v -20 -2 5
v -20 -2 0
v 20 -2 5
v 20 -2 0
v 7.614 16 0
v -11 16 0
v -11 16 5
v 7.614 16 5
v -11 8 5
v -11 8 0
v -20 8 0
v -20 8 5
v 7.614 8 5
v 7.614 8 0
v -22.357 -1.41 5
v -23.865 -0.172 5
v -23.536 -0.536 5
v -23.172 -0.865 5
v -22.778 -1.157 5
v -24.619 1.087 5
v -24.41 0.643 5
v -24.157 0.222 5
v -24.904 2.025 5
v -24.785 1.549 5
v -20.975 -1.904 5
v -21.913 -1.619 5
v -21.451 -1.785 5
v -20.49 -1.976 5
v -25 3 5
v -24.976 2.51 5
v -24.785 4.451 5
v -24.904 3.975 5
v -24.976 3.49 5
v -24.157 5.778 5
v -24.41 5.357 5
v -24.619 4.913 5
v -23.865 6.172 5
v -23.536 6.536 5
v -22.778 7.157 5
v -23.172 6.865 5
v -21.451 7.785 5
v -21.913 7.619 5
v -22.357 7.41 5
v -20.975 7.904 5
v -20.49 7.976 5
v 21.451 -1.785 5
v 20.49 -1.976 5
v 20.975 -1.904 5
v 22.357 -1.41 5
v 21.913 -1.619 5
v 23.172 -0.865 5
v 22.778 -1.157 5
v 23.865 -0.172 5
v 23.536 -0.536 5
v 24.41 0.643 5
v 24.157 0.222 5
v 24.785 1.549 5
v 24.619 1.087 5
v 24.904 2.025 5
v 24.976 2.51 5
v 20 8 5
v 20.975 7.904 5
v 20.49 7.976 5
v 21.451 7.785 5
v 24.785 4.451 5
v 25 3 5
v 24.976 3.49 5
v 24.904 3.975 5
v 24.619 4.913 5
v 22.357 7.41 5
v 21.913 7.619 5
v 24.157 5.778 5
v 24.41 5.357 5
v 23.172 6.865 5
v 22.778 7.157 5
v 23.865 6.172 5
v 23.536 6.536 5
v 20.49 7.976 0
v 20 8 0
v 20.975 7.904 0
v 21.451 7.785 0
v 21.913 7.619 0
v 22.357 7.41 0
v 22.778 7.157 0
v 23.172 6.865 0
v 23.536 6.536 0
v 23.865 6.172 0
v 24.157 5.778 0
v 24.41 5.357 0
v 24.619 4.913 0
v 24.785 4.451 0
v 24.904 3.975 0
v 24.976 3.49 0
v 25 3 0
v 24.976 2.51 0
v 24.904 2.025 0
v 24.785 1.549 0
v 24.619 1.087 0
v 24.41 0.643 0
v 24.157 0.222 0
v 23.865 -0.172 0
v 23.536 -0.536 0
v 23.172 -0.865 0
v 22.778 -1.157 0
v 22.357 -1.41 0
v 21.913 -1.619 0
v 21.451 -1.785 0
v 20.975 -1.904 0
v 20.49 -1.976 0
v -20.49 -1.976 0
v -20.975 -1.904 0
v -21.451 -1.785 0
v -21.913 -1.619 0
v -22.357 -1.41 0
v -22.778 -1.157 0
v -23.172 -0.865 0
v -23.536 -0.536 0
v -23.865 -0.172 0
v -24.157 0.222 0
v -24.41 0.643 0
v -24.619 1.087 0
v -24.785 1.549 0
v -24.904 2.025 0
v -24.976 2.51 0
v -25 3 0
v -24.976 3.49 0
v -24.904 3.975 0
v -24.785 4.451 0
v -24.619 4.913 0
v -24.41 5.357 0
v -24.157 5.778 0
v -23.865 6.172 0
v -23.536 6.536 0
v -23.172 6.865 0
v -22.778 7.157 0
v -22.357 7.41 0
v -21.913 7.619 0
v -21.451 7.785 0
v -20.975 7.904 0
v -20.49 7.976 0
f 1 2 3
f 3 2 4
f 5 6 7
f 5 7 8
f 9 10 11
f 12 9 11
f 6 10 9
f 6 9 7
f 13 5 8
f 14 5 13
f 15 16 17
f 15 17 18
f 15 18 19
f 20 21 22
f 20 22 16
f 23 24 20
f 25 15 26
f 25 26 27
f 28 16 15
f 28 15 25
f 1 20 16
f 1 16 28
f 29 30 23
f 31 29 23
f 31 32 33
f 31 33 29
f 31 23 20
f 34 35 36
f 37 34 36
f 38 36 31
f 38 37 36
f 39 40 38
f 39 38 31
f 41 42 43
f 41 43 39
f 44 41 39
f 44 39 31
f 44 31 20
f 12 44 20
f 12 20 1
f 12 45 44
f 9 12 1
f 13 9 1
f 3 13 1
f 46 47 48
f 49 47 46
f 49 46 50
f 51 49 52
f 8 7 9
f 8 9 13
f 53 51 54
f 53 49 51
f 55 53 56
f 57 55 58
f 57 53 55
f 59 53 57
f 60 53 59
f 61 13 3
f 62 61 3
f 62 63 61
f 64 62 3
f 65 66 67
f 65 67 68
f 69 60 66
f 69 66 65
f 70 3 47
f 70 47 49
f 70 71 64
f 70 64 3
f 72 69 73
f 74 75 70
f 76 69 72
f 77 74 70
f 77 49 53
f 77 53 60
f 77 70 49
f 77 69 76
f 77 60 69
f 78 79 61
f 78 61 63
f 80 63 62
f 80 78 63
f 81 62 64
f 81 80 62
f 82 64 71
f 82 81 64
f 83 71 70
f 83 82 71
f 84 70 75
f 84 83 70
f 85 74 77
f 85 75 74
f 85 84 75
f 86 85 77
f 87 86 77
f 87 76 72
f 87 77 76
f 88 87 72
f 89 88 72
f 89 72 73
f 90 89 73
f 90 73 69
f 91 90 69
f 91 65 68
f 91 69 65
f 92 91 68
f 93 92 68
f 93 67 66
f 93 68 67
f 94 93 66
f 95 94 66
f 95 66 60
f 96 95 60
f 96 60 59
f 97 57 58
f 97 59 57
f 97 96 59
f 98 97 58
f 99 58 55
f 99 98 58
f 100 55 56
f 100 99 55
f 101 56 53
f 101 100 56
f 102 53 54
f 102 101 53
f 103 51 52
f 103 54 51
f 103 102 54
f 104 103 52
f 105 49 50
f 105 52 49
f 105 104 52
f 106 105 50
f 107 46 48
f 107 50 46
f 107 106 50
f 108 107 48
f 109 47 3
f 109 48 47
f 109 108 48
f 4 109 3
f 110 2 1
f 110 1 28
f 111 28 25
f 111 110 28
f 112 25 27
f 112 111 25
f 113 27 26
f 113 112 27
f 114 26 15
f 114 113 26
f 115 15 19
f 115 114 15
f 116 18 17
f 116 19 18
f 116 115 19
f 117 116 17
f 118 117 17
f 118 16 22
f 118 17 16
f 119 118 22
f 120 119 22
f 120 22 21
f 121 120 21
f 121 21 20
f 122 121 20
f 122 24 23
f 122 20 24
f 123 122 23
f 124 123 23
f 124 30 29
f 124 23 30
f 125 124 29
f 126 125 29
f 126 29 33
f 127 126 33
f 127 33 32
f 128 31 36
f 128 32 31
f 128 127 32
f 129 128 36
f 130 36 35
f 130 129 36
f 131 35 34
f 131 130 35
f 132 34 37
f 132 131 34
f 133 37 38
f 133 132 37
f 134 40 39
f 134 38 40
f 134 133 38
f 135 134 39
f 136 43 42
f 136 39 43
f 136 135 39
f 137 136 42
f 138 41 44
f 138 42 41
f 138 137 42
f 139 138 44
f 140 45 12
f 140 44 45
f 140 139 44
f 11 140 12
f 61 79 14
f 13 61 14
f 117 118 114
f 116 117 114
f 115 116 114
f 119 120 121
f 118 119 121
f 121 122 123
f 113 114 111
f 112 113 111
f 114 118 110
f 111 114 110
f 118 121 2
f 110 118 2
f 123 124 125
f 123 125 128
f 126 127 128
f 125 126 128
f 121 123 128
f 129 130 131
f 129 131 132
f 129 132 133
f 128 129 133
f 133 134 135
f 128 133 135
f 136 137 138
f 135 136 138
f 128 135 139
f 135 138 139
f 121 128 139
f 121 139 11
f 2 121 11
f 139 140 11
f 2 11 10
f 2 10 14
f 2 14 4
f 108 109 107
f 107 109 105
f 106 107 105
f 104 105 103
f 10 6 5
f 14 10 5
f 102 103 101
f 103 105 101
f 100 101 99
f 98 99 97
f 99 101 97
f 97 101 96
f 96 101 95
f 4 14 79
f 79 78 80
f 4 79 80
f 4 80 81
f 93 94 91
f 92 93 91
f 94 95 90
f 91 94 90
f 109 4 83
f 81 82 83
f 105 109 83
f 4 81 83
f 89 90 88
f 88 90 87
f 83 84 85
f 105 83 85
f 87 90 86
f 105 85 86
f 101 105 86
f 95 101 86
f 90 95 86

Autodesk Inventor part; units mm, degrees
ref_plane "YZ Plane" through (0, 0, 0) normal (1, 0, 0) x (0, 1, 0)
ref_plane "XZ Plane" through (0, 0, 0) normal (0, 1, 0) x (-1, 0, 0)
ref_plane "XY Plane" through (0, 0, 0) normal (0, 0, 1) x (1, 0, 0)
sketch "Sketch1" plane through (0, 0, 0) normal (0, 0, 1) x (1, 0, 0)
  line L0 (-20, 3) -> (20, 3) construction
  line L1 (-20, -2) -> (20, -2)
  line L2 (20, 8) -> (-20, 8)
  arc A0 (-20, 8) -> (-20, -2) centre (-20, 3) ccw
  arc A1 (20, -2) -> (20, 8) centre (20, 3) ccw
  line L3 (-11, 16) -> (7.6141, 16)
  line L4 (7.6141, 16) -> (7.6141, 8)
  line L5 (7.6141, 8) -> (-11, 8)
  line L6 (-11, 8) -> (-11, 16)
  point P0 (0, 0)
  point P1 (0, 3)
  dimension "d0" = 10
  dimension "d2" = 40
extrude "Extrusion1" add sketch "Sketch1" along normal blind 5 contours A0 L2 A1 L1
extrude "Extrusion3" add sketch "Sketch1" along normal blind 5 contours L6 L3 L4 L2
properties material "Copper, Alloy"
